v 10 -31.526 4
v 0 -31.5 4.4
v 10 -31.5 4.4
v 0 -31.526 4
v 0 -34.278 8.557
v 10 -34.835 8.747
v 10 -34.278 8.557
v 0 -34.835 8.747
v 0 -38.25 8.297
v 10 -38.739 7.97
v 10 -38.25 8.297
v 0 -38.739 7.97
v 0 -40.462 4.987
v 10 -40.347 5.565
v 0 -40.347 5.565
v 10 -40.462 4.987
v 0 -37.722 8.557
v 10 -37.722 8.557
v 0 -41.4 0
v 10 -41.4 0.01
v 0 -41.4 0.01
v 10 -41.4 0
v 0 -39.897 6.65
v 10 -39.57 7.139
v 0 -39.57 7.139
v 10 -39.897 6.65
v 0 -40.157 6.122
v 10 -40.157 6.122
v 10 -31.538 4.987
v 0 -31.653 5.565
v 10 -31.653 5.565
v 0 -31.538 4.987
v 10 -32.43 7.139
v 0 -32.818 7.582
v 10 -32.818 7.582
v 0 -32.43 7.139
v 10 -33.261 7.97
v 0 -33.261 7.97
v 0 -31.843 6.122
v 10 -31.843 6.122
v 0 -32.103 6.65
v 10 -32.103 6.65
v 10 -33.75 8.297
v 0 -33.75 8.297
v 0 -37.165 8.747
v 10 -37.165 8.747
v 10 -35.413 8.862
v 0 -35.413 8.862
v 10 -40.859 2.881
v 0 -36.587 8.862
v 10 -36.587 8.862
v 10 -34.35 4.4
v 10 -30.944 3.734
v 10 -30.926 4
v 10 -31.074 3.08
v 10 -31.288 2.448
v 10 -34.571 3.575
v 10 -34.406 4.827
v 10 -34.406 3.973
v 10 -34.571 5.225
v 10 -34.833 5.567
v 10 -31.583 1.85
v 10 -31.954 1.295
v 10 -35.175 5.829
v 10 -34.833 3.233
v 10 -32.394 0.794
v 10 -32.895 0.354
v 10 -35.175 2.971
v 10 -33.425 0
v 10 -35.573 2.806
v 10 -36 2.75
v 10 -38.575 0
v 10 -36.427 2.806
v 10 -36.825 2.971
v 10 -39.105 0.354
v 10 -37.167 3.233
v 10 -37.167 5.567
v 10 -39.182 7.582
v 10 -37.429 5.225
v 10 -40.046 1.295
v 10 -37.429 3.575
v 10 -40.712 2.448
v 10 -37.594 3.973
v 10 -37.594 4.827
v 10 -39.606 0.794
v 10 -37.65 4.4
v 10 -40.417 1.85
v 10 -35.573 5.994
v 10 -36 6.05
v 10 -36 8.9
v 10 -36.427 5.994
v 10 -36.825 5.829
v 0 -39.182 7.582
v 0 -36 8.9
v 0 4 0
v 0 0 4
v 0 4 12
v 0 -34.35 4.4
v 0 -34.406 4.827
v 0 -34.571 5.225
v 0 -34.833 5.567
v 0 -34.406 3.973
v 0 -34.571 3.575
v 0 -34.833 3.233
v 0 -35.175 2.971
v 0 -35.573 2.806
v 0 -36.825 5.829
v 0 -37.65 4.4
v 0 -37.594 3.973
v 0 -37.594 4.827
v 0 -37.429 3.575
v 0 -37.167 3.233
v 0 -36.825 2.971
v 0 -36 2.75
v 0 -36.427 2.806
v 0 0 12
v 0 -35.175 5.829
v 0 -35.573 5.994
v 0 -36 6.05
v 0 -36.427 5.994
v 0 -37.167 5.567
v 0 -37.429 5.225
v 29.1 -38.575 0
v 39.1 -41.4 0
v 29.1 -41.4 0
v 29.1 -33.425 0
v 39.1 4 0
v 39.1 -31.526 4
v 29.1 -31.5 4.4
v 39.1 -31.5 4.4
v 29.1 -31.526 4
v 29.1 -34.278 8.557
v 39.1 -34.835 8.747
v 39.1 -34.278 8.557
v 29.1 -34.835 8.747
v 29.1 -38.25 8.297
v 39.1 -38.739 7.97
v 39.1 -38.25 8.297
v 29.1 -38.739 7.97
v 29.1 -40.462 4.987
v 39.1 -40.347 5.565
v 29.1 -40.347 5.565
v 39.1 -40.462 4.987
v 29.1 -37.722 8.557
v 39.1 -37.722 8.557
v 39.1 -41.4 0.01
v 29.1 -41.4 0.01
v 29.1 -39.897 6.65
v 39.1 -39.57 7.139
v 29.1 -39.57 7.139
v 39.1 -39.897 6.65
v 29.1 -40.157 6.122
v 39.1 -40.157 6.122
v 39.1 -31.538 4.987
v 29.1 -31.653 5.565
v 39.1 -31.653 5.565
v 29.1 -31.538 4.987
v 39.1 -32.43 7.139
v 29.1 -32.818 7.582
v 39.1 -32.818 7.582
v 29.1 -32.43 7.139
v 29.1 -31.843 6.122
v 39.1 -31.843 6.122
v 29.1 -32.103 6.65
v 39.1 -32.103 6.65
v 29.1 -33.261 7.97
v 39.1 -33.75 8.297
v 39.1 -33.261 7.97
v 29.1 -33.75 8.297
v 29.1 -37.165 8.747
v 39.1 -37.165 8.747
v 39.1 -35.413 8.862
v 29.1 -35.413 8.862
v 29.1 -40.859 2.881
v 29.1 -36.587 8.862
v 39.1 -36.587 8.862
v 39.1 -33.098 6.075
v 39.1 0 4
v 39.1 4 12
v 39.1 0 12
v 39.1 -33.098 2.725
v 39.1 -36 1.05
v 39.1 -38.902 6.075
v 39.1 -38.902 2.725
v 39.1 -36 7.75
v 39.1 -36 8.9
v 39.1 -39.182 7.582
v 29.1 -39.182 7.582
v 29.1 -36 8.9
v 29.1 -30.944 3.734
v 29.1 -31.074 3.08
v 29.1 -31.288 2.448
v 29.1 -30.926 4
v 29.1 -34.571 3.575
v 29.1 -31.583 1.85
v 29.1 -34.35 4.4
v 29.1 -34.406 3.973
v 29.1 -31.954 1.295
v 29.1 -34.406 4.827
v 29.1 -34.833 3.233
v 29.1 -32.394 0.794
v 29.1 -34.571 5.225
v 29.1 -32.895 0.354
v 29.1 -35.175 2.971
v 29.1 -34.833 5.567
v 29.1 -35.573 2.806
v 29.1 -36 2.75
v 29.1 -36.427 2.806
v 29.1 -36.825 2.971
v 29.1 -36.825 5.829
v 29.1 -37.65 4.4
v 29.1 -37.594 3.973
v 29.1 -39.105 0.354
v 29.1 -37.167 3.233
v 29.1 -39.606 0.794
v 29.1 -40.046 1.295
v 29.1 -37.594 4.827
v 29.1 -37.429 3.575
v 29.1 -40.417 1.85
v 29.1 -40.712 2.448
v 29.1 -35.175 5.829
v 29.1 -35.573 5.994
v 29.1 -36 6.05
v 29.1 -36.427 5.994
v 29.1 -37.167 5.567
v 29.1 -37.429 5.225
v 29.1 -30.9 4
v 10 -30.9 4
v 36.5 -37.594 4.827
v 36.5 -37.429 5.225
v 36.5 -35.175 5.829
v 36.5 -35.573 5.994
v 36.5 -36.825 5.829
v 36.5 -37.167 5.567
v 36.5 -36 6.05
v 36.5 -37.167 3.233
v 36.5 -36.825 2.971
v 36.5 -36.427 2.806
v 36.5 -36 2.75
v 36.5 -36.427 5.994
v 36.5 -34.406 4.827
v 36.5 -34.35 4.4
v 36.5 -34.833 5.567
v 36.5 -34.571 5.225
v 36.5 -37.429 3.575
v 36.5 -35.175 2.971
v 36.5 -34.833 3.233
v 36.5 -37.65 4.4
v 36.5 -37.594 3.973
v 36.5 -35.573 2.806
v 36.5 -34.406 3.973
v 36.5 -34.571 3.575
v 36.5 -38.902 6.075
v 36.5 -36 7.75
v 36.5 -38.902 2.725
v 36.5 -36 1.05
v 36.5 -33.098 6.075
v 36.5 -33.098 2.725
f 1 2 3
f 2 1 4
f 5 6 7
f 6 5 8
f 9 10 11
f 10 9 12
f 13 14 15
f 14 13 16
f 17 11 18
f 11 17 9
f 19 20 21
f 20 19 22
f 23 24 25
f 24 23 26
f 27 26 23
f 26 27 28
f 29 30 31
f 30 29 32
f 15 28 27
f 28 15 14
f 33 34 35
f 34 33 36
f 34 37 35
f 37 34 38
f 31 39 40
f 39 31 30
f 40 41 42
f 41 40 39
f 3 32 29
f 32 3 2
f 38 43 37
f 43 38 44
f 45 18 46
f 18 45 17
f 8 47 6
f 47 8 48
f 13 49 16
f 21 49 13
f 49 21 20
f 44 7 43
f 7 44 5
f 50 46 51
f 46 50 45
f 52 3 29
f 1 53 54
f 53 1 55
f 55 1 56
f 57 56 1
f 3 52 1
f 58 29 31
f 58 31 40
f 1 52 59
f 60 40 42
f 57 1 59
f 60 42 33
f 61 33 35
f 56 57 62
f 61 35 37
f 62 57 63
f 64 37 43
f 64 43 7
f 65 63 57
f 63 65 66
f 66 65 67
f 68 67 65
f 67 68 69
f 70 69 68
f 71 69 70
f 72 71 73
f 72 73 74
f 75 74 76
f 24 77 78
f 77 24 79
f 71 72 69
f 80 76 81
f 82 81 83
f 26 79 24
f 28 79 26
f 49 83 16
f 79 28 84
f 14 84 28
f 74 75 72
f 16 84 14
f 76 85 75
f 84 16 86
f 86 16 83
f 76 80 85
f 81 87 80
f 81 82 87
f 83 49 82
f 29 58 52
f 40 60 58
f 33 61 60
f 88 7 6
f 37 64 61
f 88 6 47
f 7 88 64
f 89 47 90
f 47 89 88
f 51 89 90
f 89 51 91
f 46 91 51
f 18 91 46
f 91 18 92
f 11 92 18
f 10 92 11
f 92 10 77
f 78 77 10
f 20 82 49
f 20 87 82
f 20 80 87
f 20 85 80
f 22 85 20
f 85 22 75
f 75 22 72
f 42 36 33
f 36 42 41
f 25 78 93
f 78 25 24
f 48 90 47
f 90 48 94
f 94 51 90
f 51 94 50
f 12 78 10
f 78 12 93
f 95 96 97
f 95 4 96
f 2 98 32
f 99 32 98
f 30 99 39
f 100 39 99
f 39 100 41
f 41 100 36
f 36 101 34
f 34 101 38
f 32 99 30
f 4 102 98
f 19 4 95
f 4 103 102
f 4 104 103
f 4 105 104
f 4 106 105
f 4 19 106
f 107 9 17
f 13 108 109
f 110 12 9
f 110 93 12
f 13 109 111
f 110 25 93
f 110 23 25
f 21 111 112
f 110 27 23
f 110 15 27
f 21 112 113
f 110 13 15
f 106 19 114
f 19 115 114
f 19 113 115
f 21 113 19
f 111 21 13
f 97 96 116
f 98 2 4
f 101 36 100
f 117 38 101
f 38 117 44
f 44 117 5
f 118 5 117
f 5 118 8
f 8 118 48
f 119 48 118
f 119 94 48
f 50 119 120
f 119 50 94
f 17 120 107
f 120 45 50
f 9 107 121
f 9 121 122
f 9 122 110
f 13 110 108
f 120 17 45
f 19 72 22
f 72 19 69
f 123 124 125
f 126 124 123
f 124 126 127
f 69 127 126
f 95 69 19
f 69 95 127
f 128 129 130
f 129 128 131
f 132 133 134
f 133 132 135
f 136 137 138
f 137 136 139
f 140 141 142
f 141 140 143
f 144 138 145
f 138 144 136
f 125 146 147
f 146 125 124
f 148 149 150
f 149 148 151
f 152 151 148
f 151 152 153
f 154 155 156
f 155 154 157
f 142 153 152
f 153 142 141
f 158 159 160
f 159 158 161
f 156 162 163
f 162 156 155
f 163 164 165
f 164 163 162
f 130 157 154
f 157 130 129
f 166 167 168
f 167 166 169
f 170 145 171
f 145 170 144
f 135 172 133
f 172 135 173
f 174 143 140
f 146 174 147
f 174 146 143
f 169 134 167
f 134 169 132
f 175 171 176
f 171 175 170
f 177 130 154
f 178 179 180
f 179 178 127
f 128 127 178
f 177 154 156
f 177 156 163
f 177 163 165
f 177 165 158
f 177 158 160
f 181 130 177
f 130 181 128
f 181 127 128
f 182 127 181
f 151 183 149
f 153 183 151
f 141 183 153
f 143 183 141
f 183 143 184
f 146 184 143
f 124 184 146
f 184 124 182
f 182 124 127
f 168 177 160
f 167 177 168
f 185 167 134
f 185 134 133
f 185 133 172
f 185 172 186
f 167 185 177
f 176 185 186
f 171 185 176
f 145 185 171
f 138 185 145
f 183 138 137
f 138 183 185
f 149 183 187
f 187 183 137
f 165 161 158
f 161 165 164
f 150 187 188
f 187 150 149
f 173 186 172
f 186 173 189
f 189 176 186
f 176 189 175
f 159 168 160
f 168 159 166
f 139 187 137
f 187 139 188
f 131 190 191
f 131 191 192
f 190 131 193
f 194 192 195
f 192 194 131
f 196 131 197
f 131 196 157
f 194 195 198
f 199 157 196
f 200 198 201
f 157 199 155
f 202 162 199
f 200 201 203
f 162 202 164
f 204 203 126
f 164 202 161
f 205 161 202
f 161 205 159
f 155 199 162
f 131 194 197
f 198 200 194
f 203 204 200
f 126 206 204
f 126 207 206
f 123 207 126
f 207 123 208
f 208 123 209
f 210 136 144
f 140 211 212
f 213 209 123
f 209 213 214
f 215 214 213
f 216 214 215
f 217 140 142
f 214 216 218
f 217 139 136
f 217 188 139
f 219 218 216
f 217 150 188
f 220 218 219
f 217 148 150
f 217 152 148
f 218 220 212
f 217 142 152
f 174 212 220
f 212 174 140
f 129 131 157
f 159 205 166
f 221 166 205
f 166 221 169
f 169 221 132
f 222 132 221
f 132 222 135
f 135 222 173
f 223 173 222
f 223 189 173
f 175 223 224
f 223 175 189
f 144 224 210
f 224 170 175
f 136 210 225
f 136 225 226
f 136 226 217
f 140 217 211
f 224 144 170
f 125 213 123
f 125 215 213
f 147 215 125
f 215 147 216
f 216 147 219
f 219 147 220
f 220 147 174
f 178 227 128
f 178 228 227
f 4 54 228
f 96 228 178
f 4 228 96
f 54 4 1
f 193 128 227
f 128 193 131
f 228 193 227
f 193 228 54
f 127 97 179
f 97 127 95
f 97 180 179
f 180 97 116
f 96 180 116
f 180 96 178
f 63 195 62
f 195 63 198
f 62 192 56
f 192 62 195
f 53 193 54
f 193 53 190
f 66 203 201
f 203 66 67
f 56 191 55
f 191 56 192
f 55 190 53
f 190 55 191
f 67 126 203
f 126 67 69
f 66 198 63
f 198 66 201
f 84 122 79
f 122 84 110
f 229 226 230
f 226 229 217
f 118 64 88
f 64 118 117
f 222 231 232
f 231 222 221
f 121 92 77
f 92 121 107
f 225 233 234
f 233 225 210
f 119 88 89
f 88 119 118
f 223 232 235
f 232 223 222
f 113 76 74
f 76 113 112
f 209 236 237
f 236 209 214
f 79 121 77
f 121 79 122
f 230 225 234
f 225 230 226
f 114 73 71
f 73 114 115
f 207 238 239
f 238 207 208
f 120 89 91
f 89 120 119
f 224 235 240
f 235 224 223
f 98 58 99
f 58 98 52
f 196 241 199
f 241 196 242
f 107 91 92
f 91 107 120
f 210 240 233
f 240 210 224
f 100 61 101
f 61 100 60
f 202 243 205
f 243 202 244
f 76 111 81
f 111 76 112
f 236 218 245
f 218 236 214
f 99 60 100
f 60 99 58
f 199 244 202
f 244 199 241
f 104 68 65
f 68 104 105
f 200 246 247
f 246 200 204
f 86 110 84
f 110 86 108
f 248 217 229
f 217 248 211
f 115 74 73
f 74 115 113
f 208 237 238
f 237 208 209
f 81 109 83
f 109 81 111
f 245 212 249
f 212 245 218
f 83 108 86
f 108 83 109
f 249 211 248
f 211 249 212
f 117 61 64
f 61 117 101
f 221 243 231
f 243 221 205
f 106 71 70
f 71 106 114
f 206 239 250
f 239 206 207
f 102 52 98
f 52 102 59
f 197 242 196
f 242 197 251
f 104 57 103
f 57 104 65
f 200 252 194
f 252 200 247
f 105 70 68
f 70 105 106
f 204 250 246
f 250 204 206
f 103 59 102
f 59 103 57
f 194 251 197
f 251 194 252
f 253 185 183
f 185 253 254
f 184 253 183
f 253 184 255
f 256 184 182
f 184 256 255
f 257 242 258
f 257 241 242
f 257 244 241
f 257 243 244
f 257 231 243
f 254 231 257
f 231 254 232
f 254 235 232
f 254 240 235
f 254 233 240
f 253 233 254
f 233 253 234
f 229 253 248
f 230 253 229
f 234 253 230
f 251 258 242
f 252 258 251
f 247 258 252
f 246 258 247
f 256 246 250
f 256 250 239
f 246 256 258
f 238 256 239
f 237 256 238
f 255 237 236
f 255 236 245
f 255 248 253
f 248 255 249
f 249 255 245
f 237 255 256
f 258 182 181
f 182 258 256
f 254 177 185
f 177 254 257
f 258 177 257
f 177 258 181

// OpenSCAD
// Monitor clip for the radar station, OBSBOT-style: a top bar that hooks the monitor's front
// edge and a hinged back leg that swings down against the back of the monitor.
// Hardware: 1x M3 x 40 socket head cap screw + 1x M3 hex nut (nut sits in a hex pocket).
// Tighten the screw until the leg holds its angle.
//
//   part = "top" : top bar. Print with its TOP face down on the bed (exported that way).
//   part = "leg" : back leg. Print with its monitor-side face down on the bed (exported that way).
//   part = "preview" : assembled with the station on top (for looking only).
//
// The station's adhesive base glues (or VHB-tapes) onto the top bar, front edges flush.
// Assembly coordinates: X across, Y front-to-back (0 = monitor front face), Z up (0 = where the
// top bar's underside sits on the monitor's front edge).

/* ---------- set these ---------- */
front_lip = 8;      // how far the front lip hangs down over the bezel (keep it off the screen)
leg_len   = 55;     // hinge axis to the end of the leg
hinge_y   = 36;     // hinge axis distance behind the monitor front; keeps the knuckles behind a ~30 mm top
leg_angle = 10;     // preview only: leg swing out from straight down

/* ---------- usually leave ---------- */
W   = 39.1;         // width, matches the station
t   = 4;            // top bar thickness
R   = 4.5;          // knuckle radius
za  = -0.4;         // hinge axis height (knuckle top is cut flush with the bar's top face)
clr = 0.4;          // gap between knuckles
k1  = 10;  k2 = W - 10;          // bar knuckles [0, k1] and [k2, W]; leg knuckle between
pin_bar = 3.3;  pin_leg = 3.4;   // M3 clearance holes
nut_af = 5.5;  nut_depth = 2.6;  // M3 nut across flats, pocket depth
leg_t = 4;

module xcyl(x0, x1, r, fn = 48) translate([x0, hinge_y, za]) rotate([0, 90, 0]) cylinder(r = r, h = x1 - x0, $fn = fn);

module top_bar() {
    difference() {
        union() {
            translate([0, -4, 0]) cube([W, hinge_y + 4, t]);                    // bar
            translate([0, -4, -front_lip]) cube([W, 4, front_lip + 0.01]);      // front lip
            for (xr = [[0, k1], [k2, W]]) intersection() {                     // bar knuckles: flush on top, with a
                hull() {                                                       // 45-degree lead-in behind them so the
                    xcyl(xr[0], xr[1], R);                                     // part never starts over air when the
                    translate([xr[0], hinge_y, t - 0.01]) cube([xr[1] - xr[0], R + 0.9, 0.01]);   // top face is on the bed
                }
                translate([-1, 0, -20]) cube([W + 2, 100, 20 + t]);
            }
        }
        xcyl(k1, k2, R + 0.6);                                                 // room for the leg knuckle to turn
        translate([k1, hinge_y - R - 0.6, -10]) cube([k2 - k1, 2 * R + 2, 10]);
        xcyl(-1, W + 1, pin_bar / 2, 24);                                       // screw hole
        // captured nut pocket on the right end, a vertex pointing down the print (no flat ceiling)
        translate([W - nut_depth, hinge_y, za]) rotate([0, 90, 0])
            cylinder(d = nut_af / cos(30) + 0.35, h = nut_depth + 1, $fn = 6);
    }
}

// leg in its own frame: hinge axis on the X axis through the origin, hanging down -Z.
// Flat face toward the monitor at y = -LF (that face goes on the bed); the barrel is trimmed
// 1 mm there so it has a flat to stand on.
LF = R - 1.0;
module leg_local() {
    lx0 = k1 + clr;  lx1 = k2 - clr;
    difference() {
        intersection() {
            union() {
                translate([lx0, 0, 0]) rotate([0, 90, 0]) cylinder(r = R, h = lx1 - lx0, $fn = 48);
                translate([lx0, -LF, -leg_len]) cube([lx1 - lx0, leg_t, leg_len]);
                translate([lx0, -LF, -leg_len]) cube([lx1 - lx0, leg_t + 2, 10]);     // stiffer foot
            }
            translate([lx0 - 1, -LF, -leg_len - 1]) cube([lx1 - lx0 + 2, 20, leg_len + 10]);
        }
        translate([lx0 - 1, 0, 0]) rotate([0, 90, 0]) cylinder(d = pin_leg, h = lx1 - lx0 + 2, $fn = 24);
    }
}
module leg_installed() translate([0, hinge_y, za]) rotate([leg_angle, 0, 0]) leg_local();

part = "top";
if (part == "top") translate([0, 0, t]) rotate([180, 0, 0]) top_bar();          // top face on the bed
else if (part == "leg") translate([0, 0, LF]) rotate([90, 0, 0]) leg_local();   // monitor-side face on the bed
else if (part == "top_installed") top_bar();
else if (part == "leg_installed") leg_installed();
else if (part == "preview") { top_bar(); leg_installed(); }
